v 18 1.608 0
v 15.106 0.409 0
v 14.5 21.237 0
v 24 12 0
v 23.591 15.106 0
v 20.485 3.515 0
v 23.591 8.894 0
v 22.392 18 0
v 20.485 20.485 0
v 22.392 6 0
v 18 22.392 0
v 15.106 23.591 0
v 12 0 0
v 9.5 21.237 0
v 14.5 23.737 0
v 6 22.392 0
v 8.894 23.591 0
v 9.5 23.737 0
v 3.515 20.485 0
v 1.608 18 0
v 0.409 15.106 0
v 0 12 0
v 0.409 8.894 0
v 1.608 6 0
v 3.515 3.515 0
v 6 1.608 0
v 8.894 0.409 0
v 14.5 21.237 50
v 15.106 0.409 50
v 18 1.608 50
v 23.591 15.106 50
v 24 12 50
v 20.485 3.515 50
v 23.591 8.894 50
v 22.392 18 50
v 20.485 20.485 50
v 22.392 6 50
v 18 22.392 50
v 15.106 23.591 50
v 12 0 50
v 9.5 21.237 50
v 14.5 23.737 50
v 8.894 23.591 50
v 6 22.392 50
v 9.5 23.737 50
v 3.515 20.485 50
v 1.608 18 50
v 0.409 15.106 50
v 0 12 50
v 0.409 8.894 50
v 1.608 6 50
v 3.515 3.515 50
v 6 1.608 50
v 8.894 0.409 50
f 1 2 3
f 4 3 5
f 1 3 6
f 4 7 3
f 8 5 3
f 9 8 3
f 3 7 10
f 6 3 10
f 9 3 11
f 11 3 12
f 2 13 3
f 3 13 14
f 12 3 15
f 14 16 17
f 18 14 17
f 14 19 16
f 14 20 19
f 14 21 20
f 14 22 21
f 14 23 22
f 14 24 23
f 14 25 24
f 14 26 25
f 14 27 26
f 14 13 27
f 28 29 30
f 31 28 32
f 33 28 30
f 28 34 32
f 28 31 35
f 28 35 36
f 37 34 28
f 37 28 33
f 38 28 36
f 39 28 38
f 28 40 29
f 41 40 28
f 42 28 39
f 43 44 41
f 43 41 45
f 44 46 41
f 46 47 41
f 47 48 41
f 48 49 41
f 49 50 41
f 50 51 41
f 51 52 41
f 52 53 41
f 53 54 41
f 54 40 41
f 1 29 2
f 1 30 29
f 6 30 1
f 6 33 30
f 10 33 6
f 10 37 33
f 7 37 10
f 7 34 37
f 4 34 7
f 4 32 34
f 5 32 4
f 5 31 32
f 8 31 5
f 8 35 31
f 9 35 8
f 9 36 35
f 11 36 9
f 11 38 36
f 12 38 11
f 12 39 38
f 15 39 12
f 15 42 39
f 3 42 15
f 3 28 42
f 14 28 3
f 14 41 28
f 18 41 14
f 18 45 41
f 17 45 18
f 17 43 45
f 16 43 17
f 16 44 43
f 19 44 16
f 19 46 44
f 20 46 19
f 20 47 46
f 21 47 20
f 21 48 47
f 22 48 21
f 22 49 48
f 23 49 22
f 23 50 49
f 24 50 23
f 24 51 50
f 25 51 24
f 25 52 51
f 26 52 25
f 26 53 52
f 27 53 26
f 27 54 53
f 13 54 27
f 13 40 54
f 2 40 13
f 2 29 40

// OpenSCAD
$fn = 32;

// ----------------------------------------------------------------------
// Keyway shaft: d24 shaft, key 5 x 2.5 mm
// ----------------------------------------------------------------------

// --- parameters (mm) ---
shaft_r = 12;             // shaft radius
key_w = 5;                // keyway width
key_d = 2.5;              // keyway depth below the surface line
plate_t = 50;             // shaft length, Z (extrusion height)

shaft_d = 2 * shaft_r;  // shaft diameter
circle_step = 15;  // polygon sampling step, degrees

profile = [[8.894, 23.591], [6, 22.392], [3.515, 20.485], [1.608, 18], [0.409, 15.106], [0, 12], [0.409, 8.894], [1.608, 6], [3.515, 3.515], [6, 1.608], [8.894, 0.409], [12, 0], [15.106, 0.409], [18, 1.608], [20.485, 3.515], [22.392, 6], [23.591, 8.894], [24, 12], [23.591, 15.106], [22.392, 18], [20.485, 20.485], [18, 22.392], [15.106, 23.591], [14.5, 23.737], [14.5, 21.237], [9.5, 21.237], [9.5, 23.737]];  // primary outline, 27 points, counter clockwise

// --- the one profile operation ---
linear_extrude(height = plate_t) polygon(points = profile);
